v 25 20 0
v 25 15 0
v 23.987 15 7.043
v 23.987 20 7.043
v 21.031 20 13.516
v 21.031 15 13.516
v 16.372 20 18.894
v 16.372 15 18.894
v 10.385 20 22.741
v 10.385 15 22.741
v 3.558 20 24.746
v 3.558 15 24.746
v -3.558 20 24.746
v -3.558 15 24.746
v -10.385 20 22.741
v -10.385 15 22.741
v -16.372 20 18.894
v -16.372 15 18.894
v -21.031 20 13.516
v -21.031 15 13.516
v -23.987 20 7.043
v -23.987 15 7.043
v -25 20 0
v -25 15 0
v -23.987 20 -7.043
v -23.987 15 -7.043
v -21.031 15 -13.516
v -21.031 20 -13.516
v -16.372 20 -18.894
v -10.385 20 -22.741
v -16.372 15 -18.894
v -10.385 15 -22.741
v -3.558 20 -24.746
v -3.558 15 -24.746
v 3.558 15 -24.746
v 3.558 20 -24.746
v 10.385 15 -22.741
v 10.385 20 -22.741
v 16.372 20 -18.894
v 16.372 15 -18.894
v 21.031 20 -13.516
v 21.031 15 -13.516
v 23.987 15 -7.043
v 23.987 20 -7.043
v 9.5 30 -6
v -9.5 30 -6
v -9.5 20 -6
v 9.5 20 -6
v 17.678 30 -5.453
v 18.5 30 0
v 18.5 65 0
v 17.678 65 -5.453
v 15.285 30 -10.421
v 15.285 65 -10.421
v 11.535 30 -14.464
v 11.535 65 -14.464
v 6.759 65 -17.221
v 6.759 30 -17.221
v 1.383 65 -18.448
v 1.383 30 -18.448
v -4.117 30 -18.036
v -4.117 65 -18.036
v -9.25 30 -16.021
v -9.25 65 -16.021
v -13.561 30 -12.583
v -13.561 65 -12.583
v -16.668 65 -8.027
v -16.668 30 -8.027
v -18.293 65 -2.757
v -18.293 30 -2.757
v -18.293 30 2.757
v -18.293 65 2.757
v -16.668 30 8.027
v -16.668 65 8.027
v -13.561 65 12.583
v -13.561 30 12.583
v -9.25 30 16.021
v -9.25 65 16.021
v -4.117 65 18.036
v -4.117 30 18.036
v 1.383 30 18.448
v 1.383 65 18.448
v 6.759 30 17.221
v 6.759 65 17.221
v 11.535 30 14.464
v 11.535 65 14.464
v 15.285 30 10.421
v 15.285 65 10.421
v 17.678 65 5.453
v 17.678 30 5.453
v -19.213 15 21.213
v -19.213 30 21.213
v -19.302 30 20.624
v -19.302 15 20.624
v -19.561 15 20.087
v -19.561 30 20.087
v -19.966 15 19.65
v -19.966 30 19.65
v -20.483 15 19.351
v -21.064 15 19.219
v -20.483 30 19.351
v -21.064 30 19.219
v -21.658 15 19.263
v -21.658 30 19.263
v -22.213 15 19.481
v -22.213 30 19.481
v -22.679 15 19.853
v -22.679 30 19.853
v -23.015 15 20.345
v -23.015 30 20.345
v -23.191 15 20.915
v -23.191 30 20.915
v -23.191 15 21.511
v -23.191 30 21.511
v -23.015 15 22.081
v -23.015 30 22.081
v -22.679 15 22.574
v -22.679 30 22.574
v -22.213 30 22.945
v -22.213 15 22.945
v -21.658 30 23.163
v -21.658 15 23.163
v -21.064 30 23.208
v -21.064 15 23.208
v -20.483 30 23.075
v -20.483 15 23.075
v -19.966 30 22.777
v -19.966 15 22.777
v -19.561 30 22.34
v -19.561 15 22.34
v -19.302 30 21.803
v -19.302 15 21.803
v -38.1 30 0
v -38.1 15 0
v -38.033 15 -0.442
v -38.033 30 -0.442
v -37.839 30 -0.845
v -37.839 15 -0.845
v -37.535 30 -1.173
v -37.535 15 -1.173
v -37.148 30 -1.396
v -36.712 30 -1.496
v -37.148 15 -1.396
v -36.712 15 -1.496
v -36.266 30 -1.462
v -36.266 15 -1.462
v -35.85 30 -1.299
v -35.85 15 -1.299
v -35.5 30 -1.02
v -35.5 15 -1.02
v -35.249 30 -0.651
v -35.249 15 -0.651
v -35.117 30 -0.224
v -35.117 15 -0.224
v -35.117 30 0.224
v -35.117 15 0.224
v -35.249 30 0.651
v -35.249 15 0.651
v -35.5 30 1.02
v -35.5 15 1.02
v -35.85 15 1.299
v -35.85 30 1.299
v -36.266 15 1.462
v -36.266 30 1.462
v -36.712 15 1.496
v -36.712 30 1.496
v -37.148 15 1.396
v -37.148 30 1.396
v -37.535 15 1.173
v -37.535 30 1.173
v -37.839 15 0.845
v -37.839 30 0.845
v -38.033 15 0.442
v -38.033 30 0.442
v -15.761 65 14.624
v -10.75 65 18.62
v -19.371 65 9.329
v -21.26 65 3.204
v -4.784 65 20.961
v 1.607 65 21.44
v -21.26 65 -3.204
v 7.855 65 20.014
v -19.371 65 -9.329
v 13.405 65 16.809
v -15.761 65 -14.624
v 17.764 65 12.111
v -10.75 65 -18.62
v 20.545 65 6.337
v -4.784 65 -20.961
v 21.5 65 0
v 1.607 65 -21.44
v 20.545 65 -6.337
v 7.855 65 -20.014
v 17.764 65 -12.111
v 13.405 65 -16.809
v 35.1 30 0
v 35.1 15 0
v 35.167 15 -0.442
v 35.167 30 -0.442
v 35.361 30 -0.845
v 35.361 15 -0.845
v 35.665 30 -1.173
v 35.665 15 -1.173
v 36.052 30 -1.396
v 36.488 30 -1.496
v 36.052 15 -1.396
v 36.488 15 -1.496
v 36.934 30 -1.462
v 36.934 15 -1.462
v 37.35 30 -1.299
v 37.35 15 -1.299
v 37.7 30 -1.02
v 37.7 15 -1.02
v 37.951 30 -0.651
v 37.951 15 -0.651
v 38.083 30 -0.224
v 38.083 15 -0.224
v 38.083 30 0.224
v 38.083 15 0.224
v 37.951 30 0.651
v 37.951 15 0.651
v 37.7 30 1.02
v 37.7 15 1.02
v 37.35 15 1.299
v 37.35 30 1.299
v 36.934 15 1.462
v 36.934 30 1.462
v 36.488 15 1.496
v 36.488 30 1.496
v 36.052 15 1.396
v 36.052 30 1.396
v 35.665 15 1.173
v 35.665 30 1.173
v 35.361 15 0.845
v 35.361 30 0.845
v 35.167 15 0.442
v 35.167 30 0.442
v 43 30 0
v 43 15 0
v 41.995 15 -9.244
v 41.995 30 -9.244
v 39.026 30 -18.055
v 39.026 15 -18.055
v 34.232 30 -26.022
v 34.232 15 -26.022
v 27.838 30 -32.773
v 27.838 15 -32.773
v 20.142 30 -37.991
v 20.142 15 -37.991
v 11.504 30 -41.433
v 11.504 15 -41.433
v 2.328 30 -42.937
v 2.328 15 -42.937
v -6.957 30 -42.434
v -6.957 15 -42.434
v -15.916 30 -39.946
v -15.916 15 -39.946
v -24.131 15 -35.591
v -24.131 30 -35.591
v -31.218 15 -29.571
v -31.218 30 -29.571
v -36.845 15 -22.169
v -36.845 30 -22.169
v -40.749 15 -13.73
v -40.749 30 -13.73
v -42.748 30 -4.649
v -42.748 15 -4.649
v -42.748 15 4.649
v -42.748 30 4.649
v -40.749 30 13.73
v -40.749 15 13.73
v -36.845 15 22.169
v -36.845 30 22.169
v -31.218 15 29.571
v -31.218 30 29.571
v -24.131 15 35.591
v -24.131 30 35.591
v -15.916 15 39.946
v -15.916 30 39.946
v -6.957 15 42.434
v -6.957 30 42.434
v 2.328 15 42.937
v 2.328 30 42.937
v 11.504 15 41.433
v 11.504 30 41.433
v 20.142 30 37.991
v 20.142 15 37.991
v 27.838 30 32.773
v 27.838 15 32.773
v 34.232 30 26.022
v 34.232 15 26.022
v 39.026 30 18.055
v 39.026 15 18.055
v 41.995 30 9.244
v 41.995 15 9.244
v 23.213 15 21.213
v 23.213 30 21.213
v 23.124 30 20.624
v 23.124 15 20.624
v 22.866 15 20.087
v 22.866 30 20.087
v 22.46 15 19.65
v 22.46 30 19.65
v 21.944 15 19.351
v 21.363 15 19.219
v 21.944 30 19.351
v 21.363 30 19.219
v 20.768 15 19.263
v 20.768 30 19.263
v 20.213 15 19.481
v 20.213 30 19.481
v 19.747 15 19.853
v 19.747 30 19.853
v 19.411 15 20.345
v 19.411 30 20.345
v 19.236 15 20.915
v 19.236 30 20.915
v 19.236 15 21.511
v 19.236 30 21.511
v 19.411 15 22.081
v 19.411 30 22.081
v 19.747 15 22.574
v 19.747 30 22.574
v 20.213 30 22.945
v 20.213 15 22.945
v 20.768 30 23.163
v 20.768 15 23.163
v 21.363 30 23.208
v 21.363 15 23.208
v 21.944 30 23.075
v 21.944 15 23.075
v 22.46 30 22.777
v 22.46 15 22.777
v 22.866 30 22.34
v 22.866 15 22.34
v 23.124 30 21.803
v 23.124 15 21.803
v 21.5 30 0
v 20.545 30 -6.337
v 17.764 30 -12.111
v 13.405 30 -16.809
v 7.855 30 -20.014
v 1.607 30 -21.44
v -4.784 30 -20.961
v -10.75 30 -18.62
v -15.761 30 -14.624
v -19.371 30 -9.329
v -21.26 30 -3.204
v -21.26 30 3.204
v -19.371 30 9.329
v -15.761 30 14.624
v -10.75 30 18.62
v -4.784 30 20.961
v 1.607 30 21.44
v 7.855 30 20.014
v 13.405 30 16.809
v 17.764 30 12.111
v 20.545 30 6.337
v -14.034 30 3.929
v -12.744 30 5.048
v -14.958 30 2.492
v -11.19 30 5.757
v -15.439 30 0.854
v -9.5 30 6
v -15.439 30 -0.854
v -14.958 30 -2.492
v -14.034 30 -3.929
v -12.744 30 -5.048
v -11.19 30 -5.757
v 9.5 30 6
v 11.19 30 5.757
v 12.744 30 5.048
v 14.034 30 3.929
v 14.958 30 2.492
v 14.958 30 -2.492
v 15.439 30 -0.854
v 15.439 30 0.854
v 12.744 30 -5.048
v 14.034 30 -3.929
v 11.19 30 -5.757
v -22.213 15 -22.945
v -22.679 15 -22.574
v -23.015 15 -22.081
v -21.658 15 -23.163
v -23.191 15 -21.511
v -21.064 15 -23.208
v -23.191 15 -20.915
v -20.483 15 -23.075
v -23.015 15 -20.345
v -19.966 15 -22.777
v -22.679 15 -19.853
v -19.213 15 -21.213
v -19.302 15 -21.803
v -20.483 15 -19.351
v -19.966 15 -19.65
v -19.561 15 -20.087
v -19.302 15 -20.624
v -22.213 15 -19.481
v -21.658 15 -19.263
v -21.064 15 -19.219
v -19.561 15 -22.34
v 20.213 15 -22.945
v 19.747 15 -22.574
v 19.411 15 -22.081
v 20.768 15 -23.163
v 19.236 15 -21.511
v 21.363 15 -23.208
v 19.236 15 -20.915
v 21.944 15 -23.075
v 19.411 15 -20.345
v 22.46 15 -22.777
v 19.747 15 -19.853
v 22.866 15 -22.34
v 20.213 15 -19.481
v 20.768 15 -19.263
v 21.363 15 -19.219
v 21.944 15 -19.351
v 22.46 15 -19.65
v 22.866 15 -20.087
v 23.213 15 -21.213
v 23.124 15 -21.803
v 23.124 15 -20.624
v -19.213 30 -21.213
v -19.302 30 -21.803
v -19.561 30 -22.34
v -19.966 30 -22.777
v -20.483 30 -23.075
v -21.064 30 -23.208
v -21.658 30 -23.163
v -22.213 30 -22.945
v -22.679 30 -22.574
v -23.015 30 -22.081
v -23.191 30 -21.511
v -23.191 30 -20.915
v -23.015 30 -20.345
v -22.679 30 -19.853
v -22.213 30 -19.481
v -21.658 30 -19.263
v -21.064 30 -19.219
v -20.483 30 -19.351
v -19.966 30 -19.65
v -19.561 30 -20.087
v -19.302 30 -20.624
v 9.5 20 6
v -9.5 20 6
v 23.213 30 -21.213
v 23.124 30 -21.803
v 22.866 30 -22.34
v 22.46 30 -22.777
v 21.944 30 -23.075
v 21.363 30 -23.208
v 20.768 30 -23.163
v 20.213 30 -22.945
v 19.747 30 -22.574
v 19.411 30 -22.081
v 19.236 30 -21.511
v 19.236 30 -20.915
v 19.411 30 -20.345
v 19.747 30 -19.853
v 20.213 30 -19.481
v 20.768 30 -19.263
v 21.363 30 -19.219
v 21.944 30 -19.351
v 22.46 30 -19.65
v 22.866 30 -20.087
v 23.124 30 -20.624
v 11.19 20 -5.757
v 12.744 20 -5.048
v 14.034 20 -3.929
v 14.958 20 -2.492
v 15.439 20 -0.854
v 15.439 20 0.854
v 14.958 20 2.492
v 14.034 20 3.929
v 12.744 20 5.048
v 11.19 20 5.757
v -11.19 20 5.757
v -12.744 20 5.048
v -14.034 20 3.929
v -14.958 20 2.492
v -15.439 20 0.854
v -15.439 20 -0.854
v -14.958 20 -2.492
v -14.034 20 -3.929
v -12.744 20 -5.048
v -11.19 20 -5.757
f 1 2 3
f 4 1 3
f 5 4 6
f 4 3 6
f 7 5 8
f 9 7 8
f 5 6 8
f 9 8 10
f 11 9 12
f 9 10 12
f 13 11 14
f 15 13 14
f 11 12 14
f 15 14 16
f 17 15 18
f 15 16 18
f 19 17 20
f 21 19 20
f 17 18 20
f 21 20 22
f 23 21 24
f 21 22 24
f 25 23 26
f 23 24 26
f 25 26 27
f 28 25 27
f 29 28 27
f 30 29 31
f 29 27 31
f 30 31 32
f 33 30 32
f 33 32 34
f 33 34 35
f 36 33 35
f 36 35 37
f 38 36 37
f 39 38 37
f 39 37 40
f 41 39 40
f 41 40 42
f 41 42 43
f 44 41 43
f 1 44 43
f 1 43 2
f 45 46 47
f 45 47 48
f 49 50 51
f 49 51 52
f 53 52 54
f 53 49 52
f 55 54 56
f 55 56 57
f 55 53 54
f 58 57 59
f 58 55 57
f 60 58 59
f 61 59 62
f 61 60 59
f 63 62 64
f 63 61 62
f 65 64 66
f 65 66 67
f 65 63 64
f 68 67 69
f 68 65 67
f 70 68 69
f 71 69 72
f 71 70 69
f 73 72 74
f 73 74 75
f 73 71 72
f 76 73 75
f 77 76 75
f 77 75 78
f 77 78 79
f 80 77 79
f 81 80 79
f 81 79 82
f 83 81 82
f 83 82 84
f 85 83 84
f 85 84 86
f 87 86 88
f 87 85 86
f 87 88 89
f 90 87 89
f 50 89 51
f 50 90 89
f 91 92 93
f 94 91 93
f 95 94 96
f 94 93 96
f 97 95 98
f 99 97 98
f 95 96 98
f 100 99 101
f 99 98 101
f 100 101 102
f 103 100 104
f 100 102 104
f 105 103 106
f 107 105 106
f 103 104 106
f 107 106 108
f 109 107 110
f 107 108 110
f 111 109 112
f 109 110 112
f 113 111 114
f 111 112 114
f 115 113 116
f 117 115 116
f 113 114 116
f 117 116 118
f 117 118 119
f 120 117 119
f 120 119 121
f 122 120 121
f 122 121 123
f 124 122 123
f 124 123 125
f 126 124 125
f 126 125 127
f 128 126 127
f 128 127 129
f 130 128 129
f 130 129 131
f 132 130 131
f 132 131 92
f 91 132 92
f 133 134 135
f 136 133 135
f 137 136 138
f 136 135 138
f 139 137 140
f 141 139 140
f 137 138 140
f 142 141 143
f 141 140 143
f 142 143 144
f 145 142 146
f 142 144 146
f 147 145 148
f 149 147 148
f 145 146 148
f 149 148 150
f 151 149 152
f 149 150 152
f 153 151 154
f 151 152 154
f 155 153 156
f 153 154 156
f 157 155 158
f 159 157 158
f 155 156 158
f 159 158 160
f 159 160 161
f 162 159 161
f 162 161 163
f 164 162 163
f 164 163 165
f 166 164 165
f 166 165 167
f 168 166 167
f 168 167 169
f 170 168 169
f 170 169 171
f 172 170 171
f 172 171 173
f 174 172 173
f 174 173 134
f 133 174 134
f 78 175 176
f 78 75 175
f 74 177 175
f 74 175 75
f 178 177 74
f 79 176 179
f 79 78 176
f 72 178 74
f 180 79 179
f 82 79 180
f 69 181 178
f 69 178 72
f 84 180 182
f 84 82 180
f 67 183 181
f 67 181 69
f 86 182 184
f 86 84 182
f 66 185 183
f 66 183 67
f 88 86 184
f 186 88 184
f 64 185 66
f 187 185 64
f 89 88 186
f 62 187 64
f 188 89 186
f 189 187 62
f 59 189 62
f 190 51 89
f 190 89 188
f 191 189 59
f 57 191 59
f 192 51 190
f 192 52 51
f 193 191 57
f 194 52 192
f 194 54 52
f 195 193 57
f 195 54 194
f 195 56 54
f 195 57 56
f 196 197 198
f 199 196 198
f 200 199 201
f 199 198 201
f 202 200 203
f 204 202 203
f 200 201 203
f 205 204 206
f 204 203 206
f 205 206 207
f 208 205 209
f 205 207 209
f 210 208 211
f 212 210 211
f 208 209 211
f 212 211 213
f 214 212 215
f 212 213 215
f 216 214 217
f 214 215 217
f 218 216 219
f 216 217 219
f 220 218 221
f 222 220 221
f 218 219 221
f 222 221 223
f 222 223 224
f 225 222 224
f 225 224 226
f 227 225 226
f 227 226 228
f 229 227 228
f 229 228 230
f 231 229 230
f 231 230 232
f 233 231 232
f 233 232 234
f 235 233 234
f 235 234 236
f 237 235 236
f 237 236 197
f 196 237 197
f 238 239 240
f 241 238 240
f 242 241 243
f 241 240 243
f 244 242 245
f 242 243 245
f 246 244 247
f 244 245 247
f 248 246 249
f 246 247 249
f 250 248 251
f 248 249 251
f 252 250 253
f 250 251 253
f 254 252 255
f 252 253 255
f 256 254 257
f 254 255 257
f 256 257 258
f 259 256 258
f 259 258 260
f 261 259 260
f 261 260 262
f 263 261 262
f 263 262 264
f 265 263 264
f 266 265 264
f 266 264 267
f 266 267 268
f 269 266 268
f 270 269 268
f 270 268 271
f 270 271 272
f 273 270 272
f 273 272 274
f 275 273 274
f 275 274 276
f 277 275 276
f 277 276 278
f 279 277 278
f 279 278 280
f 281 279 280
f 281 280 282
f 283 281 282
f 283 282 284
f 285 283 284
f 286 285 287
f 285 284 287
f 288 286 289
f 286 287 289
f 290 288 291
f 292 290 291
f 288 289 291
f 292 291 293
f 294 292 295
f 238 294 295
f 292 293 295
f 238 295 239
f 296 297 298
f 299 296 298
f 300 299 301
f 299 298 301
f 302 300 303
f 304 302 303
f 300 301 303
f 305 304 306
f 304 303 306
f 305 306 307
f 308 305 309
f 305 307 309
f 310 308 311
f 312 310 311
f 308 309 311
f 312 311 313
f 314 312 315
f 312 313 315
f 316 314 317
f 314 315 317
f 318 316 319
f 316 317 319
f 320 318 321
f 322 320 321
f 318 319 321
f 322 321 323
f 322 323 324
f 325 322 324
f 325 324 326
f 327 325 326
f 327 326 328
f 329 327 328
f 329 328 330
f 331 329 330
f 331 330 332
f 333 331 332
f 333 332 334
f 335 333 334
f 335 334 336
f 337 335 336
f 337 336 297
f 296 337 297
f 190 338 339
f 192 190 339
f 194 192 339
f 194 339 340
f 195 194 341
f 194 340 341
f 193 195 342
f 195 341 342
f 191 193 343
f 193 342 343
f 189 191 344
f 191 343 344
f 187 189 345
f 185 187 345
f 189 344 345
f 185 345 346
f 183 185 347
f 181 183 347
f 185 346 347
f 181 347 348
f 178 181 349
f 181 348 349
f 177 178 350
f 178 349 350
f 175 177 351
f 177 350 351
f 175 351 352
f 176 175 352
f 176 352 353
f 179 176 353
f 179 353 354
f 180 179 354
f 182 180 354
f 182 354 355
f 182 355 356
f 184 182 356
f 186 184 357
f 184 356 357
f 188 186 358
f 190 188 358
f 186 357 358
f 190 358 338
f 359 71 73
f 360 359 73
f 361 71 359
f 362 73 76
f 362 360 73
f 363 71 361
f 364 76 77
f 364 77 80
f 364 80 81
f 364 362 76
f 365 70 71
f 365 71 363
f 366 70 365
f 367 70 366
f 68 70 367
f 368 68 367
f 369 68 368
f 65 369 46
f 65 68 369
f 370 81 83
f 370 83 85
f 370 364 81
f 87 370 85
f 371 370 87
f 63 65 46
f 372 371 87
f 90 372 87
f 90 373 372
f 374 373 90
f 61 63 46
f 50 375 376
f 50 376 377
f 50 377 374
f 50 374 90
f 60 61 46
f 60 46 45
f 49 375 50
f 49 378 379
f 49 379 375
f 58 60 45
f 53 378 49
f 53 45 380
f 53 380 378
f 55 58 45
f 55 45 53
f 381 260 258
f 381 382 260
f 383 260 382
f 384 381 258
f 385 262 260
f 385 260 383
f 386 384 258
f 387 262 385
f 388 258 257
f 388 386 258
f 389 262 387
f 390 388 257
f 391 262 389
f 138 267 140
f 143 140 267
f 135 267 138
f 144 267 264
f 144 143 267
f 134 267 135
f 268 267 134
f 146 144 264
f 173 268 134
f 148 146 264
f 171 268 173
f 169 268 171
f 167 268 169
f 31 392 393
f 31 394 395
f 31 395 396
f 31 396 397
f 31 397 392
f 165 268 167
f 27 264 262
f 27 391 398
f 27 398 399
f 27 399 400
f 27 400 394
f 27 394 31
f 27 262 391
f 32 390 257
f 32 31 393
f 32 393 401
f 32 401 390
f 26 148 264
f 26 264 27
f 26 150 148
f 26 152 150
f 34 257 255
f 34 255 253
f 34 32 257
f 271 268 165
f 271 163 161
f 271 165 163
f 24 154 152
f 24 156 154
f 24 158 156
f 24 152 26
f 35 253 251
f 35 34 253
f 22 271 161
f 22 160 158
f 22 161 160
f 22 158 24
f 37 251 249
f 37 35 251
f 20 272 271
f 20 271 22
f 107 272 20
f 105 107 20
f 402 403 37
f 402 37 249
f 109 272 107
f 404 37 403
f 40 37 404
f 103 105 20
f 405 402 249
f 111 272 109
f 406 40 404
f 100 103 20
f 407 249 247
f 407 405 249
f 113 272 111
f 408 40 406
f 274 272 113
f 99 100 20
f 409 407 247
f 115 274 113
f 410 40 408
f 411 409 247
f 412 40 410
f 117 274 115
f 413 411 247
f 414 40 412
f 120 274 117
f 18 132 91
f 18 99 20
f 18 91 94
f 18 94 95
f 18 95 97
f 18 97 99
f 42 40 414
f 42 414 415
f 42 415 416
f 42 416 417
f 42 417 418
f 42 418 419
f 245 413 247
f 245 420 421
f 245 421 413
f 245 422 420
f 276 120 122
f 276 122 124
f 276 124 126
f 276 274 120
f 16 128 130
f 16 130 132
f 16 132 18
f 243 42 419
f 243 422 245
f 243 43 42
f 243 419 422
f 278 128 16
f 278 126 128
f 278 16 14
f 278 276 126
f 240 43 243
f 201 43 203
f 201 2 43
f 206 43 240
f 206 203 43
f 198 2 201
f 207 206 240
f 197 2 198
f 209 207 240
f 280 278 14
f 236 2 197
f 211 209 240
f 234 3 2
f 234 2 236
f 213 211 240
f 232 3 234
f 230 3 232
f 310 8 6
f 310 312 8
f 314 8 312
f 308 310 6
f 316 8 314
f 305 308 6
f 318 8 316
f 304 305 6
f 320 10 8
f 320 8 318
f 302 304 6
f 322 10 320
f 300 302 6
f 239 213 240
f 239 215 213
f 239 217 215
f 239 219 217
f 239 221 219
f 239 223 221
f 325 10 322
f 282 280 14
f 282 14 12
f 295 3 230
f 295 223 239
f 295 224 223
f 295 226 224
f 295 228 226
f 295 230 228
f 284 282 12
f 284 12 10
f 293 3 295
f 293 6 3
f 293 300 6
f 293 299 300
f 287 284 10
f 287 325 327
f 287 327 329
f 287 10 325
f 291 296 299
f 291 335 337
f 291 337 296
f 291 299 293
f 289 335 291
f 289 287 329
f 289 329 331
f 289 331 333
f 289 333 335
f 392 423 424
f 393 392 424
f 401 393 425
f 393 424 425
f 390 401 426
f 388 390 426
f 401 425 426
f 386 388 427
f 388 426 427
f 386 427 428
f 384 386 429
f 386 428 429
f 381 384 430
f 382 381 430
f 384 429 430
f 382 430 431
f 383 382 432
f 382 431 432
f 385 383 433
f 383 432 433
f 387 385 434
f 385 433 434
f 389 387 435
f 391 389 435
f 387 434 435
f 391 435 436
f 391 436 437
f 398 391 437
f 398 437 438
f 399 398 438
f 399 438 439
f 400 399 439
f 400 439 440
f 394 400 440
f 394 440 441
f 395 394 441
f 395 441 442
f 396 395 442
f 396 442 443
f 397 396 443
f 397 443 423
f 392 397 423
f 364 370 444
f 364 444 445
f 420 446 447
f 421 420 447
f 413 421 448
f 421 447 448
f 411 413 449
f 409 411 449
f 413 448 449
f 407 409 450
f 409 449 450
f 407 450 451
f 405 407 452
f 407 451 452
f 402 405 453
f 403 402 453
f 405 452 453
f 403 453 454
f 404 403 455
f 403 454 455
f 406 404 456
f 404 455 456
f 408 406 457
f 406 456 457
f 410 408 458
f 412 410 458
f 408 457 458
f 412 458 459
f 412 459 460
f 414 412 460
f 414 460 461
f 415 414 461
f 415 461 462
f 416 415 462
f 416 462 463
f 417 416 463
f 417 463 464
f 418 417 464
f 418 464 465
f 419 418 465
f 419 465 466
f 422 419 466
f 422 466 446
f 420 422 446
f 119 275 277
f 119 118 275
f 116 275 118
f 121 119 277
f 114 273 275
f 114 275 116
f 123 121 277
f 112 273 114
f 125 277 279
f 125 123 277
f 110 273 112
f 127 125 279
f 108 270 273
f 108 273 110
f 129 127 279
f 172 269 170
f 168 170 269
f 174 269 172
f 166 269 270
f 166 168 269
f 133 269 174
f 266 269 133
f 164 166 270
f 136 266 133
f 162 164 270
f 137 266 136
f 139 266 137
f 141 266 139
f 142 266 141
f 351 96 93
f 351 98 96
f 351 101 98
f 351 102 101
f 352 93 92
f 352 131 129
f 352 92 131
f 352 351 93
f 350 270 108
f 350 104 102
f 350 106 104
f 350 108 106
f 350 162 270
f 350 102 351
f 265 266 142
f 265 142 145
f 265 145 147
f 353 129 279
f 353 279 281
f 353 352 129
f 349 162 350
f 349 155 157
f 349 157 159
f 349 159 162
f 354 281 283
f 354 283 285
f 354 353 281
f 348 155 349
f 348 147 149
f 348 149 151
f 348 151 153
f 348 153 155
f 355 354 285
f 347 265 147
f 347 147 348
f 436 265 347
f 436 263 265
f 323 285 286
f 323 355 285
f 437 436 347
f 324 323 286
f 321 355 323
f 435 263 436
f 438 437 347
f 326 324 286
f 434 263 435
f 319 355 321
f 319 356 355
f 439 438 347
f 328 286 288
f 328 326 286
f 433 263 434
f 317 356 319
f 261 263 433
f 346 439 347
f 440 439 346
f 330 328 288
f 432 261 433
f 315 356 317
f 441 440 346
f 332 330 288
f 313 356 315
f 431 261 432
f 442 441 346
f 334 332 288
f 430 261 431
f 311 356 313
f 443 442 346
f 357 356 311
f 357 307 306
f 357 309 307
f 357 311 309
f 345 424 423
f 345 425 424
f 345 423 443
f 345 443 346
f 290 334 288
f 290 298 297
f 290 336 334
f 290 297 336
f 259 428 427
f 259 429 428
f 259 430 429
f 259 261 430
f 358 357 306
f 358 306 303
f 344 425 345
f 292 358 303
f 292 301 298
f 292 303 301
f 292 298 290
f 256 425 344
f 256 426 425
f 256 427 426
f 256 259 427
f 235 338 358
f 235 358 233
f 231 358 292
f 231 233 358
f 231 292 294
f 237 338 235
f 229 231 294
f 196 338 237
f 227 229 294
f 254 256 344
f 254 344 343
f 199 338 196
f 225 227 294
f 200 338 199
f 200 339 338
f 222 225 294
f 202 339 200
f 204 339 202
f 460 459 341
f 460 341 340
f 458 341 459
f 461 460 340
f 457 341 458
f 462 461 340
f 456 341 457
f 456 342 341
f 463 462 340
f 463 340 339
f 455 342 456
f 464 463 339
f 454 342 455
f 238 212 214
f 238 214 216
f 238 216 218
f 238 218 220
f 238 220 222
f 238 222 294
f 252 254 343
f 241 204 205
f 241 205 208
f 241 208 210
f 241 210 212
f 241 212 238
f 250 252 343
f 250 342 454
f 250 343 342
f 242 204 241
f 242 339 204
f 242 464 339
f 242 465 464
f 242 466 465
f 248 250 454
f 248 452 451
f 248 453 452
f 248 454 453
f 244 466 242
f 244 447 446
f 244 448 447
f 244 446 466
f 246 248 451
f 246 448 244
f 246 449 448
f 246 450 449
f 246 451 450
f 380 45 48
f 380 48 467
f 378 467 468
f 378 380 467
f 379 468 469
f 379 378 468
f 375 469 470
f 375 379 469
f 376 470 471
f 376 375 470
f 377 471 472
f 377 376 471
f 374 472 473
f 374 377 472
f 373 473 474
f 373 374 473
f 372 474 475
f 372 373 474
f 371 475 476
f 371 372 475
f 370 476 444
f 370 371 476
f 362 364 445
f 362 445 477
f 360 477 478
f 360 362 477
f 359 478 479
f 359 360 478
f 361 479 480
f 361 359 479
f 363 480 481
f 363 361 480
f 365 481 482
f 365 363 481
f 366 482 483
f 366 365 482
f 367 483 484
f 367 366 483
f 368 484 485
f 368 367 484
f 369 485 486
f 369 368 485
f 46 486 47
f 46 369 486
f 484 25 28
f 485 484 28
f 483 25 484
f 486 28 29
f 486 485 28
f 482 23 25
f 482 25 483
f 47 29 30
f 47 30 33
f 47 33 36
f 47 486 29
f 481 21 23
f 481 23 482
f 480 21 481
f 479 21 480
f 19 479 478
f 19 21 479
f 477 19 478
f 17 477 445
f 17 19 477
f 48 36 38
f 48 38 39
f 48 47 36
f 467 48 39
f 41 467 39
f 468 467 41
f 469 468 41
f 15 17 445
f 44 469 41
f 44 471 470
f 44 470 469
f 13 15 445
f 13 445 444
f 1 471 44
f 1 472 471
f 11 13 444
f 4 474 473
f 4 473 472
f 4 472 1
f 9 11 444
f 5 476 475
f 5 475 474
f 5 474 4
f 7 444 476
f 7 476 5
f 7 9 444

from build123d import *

# Parameters (mm, degrees)
SKETCH1_R             = 43
BOSS_EXTRUDE1_DEPTH   = 30
SKETCH6_R             = 25
CUT_EXTRUDE4_DEPTH    = 20
SKETCH10_R            = 21.5
SKETCH10_R_2          = 18.5
BOSS_EXTRUDE2_DEPTH   = 35
CUT_EXTRUDE6_DEPTH    = 31
F_3_0MM_DOWEL_HOLE1_D = 3
F_4_0MM_DOWEL_HOLE2_D = 4
SKETCH27_R            = 51.993622625
CUT_EXTRUDE7_DEPTH    = 15


with BuildPart() as part:
    # Sketch1 → Boss-Extrude1 (new body)
    with BuildSketch(Plane(origin=(0, 0, 0), x_dir=(1, 0, 0), z_dir=(0, 1, 0))):
        Circle(SKETCH1_R)
    extrude(amount=BOSS_EXTRUDE1_DEPTH)

    # Sketch6 → Cut-Extrude4 (cut)
    with BuildSketch(Plane.XZ):
        Circle(SKETCH6_R)
    extrude(amount=-CUT_EXTRUDE4_DEPTH, mode=Mode.SUBTRACT)

    # Sketch10 → Boss-Extrude2 (add)
    with BuildSketch(Plane(origin=(0, 30, 0), x_dir=(1, 0, 0), z_dir=(0, 1, 0))):
        Circle(SKETCH10_R)
        Circle(SKETCH10_R_2, mode=Mode.SUBTRACT)
    extrude(amount=BOSS_EXTRUDE2_DEPTH)

    # Sketch12 → Cut-Extrude6 (cut, through all)
    with BuildSketch(Plane(origin=(0, 30, 0), x_dir=(1, 0, 0), z_dir=(0, 1, 0))):
        with BuildLine():
            Line((-9.5, 6), (9.5, 6))
            ThreePointArc((9.5, 6), (15.5, 0), (9.5, -6))
            Line((9.5, -6), (-9.5, -6))
            ThreePointArc((-9.5, -6), (-15.5, 0), (-9.5, 6))
        make_face()
    extrude(amount=-CUT_EXTRUDE6_DEPTH, mode=Mode.SUBTRACT)

    # Ø3.0mm Dowel Hole1 (through all)
    with Locations(Plane(origin=(0, 30, 0), x_dir=(1, 0, 0), z_dir=(0, 1, 0))):
        with Locations((-36.6, 0), (36.6, 0)):
            Hole(F_3_0MM_DOWEL_HOLE1_D / 2)

    # Ø4.0mm Dowel Hole2 (through all)
    with Locations(Plane(origin=(0, 0, 0), x_dir=(-1, 0, 0), z_dir=(0, -1, 0))):
        with Locations((-21.213203436, -21.213203436), (21.213203436, -21.213203436), (-21.213203436, 21.213203436), (21.213203436, 21.213203436)):
            Hole(F_4_0MM_DOWEL_HOLE2_D / 2)

    # Sketch27 → Cut-Extrude7 (cut)
    with BuildSketch(Plane.XZ):
        Circle(SKETCH27_R)
    extrude(amount=-CUT_EXTRUDE7_DEPTH, mode=Mode.SUBTRACT)


solid = part.part
